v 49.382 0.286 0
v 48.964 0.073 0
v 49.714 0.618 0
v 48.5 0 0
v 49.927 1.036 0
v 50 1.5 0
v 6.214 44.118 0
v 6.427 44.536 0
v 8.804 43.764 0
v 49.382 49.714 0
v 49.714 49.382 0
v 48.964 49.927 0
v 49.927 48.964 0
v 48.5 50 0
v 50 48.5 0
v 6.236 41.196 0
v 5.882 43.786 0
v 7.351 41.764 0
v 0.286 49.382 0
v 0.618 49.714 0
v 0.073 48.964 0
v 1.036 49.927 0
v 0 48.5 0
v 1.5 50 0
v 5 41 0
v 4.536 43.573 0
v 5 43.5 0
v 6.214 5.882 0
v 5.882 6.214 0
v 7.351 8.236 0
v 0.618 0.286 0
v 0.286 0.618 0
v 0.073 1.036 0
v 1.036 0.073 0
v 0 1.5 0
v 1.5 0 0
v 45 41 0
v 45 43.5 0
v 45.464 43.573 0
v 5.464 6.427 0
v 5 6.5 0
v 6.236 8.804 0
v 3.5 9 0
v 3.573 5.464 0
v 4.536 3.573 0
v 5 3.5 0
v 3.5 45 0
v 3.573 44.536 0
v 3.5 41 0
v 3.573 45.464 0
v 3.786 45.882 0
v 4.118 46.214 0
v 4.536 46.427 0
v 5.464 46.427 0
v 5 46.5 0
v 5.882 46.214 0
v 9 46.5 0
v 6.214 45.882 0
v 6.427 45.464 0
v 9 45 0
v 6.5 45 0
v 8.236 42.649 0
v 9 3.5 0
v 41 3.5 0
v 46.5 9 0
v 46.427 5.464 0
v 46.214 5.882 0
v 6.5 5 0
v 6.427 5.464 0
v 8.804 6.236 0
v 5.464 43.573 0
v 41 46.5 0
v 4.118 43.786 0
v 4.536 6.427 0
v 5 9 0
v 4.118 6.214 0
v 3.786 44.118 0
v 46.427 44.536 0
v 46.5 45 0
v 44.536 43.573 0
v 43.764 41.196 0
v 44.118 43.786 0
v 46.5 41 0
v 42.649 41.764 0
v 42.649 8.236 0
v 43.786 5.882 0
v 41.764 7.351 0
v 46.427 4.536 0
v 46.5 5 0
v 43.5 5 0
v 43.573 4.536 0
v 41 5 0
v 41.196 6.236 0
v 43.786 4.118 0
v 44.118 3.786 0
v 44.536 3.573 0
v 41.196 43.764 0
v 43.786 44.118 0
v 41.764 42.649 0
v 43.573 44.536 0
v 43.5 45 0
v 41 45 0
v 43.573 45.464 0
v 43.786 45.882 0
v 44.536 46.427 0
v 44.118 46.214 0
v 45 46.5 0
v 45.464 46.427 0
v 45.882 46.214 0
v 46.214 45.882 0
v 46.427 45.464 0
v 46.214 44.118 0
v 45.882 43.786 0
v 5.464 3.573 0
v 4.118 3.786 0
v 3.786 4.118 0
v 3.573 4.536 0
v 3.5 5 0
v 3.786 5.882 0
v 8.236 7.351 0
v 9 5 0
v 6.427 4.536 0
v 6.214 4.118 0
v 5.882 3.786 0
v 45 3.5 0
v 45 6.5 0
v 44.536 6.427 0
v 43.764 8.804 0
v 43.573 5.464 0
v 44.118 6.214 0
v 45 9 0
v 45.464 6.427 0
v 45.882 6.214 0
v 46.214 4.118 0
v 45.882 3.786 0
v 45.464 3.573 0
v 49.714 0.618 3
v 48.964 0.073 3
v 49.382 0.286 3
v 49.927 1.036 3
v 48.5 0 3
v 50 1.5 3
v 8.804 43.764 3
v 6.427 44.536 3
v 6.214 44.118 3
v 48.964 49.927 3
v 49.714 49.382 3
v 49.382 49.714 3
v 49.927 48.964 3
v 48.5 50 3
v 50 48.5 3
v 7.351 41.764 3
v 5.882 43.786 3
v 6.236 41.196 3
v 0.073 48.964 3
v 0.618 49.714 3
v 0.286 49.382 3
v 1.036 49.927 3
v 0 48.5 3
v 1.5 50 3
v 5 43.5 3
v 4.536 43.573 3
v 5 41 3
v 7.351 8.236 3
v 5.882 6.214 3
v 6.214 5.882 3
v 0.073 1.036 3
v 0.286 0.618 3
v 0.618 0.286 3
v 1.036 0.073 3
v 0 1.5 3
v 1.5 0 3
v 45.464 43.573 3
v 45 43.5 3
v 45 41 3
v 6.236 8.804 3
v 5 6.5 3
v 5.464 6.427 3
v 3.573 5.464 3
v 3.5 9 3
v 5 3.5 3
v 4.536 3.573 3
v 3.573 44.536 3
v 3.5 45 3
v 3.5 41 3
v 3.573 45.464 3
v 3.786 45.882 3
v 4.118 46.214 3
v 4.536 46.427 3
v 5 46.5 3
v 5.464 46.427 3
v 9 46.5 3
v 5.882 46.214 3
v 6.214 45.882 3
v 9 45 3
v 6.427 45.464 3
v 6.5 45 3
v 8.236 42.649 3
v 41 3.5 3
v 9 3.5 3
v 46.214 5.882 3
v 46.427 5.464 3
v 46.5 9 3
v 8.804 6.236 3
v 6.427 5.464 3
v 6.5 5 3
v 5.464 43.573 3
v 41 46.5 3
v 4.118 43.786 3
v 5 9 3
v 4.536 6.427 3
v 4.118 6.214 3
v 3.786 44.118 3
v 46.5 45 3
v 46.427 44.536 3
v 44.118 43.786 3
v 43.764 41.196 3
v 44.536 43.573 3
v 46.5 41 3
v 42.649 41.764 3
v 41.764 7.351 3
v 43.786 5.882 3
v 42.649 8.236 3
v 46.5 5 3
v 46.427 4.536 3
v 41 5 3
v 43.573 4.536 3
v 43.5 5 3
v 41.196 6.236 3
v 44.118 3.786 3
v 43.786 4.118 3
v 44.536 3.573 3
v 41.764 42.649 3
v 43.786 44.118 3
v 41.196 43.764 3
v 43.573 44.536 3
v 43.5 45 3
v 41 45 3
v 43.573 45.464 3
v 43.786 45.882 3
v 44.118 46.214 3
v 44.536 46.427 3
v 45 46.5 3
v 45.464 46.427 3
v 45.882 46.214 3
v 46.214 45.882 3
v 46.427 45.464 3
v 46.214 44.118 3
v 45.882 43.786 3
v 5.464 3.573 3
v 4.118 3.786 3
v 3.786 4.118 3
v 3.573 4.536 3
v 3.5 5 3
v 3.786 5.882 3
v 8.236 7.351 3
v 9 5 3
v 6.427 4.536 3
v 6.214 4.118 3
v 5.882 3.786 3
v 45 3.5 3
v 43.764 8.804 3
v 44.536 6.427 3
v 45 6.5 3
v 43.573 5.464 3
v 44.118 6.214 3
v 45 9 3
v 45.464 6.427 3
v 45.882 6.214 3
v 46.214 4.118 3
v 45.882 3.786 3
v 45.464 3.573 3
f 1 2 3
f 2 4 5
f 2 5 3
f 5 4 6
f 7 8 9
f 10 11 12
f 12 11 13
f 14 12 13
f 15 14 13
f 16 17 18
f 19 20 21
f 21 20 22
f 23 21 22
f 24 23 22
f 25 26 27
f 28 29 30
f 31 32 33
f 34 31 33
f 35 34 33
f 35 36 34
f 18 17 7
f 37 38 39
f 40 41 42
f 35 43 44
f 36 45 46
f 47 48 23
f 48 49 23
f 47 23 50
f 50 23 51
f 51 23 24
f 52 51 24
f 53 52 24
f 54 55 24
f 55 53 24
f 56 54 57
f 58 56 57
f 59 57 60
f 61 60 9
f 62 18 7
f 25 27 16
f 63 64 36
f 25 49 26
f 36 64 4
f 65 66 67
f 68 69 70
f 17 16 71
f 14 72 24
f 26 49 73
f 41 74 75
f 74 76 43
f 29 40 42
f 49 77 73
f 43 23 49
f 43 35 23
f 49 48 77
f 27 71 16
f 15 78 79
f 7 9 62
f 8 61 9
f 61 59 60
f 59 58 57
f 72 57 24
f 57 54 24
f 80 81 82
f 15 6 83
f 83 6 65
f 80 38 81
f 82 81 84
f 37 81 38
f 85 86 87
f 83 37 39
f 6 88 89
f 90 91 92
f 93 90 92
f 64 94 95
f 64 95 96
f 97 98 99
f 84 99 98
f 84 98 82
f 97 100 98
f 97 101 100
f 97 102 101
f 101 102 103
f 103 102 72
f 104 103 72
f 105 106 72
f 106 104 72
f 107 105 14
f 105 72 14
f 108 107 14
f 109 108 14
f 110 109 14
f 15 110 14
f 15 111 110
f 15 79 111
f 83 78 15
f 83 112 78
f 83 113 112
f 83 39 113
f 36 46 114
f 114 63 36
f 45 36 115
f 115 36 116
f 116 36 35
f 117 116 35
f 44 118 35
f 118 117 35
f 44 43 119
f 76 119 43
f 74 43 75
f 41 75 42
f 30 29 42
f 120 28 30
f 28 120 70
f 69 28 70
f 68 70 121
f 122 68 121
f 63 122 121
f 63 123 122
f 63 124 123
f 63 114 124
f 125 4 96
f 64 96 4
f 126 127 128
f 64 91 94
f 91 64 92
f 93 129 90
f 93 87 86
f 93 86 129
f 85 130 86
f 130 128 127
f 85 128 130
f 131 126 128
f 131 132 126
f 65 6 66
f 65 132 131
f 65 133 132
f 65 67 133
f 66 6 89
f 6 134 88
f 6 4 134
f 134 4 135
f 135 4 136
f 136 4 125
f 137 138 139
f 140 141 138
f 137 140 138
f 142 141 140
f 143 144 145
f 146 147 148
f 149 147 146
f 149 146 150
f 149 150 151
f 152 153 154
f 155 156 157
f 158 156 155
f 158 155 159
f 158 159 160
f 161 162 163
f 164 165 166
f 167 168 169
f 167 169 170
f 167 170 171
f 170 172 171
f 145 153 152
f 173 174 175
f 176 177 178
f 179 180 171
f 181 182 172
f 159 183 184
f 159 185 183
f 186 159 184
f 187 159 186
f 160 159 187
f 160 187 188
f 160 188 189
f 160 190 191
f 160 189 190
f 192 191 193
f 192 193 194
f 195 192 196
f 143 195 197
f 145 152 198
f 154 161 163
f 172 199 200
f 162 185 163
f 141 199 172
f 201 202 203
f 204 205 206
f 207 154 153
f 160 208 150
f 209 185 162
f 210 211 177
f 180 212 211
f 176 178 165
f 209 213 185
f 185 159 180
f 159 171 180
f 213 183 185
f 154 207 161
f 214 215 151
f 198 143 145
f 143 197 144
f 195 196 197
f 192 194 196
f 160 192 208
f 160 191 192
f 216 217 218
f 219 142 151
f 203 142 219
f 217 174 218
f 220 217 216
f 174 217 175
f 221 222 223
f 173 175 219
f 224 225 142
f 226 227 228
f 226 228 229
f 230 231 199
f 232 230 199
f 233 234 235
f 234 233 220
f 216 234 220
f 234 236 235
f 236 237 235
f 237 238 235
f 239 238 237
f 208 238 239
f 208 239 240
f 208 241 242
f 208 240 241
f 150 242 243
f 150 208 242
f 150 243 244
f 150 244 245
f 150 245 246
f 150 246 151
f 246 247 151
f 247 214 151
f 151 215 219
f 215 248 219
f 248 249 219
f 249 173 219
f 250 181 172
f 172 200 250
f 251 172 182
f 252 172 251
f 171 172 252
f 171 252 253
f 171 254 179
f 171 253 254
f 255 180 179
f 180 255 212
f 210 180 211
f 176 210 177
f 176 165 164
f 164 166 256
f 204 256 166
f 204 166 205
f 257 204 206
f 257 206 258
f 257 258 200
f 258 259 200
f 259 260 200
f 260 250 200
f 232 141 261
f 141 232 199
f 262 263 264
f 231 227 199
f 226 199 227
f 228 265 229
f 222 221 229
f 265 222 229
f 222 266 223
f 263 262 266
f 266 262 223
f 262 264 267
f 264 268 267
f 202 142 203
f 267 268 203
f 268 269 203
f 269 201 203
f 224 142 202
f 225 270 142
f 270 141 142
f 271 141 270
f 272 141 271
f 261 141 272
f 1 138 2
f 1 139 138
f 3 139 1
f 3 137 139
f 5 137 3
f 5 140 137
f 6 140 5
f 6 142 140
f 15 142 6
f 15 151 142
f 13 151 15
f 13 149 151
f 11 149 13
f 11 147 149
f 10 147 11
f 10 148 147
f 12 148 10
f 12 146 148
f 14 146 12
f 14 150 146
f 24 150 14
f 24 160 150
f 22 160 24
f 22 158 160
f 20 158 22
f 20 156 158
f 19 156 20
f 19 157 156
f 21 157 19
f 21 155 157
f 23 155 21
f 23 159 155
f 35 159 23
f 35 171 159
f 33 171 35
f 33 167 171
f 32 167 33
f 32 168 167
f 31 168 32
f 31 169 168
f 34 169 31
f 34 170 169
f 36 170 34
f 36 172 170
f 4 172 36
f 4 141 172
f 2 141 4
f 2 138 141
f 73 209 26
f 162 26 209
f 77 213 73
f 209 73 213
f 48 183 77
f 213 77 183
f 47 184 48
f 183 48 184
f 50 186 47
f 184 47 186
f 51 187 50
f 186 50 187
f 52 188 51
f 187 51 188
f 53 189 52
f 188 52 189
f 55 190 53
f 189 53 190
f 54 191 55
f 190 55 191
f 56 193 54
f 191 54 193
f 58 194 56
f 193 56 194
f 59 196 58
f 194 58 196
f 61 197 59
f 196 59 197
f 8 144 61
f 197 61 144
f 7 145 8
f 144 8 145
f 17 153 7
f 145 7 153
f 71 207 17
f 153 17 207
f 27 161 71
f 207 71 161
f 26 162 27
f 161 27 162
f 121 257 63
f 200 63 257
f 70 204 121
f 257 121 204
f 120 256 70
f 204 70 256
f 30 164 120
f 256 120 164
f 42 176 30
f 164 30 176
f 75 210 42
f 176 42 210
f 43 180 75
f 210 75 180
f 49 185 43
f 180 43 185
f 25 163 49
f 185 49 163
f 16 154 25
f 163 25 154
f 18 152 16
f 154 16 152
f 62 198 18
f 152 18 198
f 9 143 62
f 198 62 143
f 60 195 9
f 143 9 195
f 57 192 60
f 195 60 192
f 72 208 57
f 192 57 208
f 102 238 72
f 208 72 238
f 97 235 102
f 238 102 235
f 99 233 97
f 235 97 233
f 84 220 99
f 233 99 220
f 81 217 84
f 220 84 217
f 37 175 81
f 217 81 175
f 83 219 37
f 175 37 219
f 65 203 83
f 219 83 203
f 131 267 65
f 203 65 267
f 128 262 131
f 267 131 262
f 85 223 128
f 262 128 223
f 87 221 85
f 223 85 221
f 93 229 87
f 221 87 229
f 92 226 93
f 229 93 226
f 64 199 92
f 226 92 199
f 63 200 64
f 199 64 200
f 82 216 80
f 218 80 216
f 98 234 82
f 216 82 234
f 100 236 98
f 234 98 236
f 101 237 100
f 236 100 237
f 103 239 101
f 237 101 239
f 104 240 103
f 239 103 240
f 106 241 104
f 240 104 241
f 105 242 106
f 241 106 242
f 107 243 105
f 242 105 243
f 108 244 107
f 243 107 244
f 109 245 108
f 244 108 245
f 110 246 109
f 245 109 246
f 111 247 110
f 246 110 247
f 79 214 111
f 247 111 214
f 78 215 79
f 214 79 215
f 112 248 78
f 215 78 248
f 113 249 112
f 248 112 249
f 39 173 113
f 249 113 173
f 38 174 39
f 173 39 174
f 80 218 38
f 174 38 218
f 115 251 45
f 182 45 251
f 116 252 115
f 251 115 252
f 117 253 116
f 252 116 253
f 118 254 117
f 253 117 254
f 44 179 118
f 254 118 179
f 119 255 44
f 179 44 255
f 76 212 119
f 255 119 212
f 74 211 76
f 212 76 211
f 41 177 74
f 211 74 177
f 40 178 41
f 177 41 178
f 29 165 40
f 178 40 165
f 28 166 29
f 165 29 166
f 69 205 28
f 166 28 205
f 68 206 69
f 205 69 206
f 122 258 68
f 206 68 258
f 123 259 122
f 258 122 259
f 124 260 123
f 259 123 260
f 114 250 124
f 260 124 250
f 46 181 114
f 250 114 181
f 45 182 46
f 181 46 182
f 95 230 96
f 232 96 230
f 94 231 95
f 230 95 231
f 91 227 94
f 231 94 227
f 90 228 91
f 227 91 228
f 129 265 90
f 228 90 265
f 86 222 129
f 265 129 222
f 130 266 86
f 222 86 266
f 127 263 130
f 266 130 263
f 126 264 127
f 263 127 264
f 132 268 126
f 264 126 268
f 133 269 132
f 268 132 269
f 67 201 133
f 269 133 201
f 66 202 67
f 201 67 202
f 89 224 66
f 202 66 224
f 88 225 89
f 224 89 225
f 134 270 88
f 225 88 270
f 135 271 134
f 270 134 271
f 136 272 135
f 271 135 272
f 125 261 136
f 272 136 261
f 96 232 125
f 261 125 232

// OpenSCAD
/*
OPENSCAD Library file by the DoomMeister
Mounting surround for small DC fans (25 - 120mm)

Data taken from various places around the internet.
http://www.qwikflow.com/dc_fans.html

//Released under the terms of the GNU GPL v3.0
This program is free software: you can redistribute it and/or modify
it under the terms of the GNU General Public License as published by
the Free Software Foundation, either version 3 of the License, or
(at your option) any later version.

This program is distributed in the hope that it will be useful,
but WITHOUT ANY WARRANTY; without even the implied warranty of
MERCHANTABILITY or FITNESS FOR A PARTICULAR PURPOSE. See the
GNU General Public License for more details.

You should have received a copy of the GNU General Public License
along with this program. If not, see <http://www.gnu.org/licenses/>.
*/

//uncomment this for example
fan_mount(size=50,thick=3);

module fan_mount(size=40,thick = 4)
{
if(size == 25)
	{
	_fan_mount(
			fan_size = 25,
			fan_mounting_pitch = 20,
			fan_m_hole_dia = 3,
			holder_thickness = thick
		 );
	}
if(size == 30)
	{
	_fan_mount(
			fan_size = 30,
			fan_mounting_pitch = 24,
			fan_m_hole_dia = 3,
			holder_thickness = thick
		 );
	}

if(size == 40)
	{
	_fan_mount(
			fan_size = 40,
			fan_mounting_pitch = 32,
			fan_m_hole_dia = 3.5,
			holder_thickness = thick
		 );
	}
if(size == 45)
	{
	_fan_mount(
			fan_size = 45,
			fan_mounting_pitch = 37,
			fan_m_hole_dia = 4.3,
			holder_thickness = thick
		 );
	}
if(size == 50)
	{
	_fan_mount(
			fan_size = 50,
			fan_mounting_pitch = 40,
			fan_m_hole_dia = 3,
			holder_thickness = thick
		 );
	}    
if(size == 60)
	{
	_fan_mount(
			fan_size = 60,
			fan_mounting_pitch = 50,
			fan_m_hole_dia = 4.4,
			holder_thickness = thick
		 );
	}
if(size == 80)
	{
	_fan_mount(
			fan_size = 80,
			fan_mounting_pitch = 71.5,
			fan_m_hole_dia = 4.4,
			holder_thickness = thick
		 );
	}

if(size == 120)
	{
	_fan_mount(
			fan_size = 120,
			fan_mounting_pitch = 105,
			fan_m_hole_dia = 4.4,
			holder_thickness = thick
		 );
	}
}


//inner module
module _fan_mount(
			fan_size, //nominsl size of fan
			fan_mounting_pitch, //pitch between mounting holes
			fan_m_hole_dia, //mounting hole diameter
			holder_thickness //user defined thickness
		 )
{

offset1 = (fan_size-(fan_mounting_pitch + fan_m_hole_dia))/2;
offset2 = (fan_size-(fan_mounting_pitch))/2;
offset3 = offset2 + fan_mounting_pitch;
thickness = (fan_size-fan_mounting_pitch)/2;	
			
			//difference()
			//{
			linear_extrude(height = holder_thickness)
			union()
			{	
			difference()
			{
				translate([fan_m_hole_dia/2,fan_m_hole_dia/2,0])
				minkowski()
				{	
					square([fan_size - fan_m_hole_dia,fan_size - fan_m_hole_dia]);
					circle(r= fan_m_hole_dia/2, $fn=20);
				}
			
					translate([offset1,offset1,0])
					square([fan_mounting_pitch + fan_m_hole_dia,fan_mounting_pitch + fan_m_hole_dia]);
				}
				translate([offset2,offset2,0])
				rotate([0,0,0])_corner_hole();
				translate([offset3,offset2,0])
				rotate([0,0,90])_corner_hole();
				translate([offset2,offset3,0])
				rotate([0,0,90])_corner_hole();
				translate([offset3,offset3,0])
				rotate([0,0,0])_corner_hole();
			}

module _corner_hole()
{
				difference(){
					union(){
							difference(){
							square([fan_m_hole_dia + thickness,fan_m_hole_dia + thickness],center=true);
							square([(fan_m_hole_dia + thickness)/2,(fan_m_hole_dia + thickness)/2],center=false);
							translate([-(fan_m_hole_dia + thickness)/2,-(fan_m_hole_dia + thickness)/2])
							square([(fan_m_hole_dia + thickness)/2,(fan_m_hole_dia + thickness)/2],center=false);
							}
					circle(r=(fan_m_hole_dia + thickness)/2, $fn=20);
					}
					circle(r=(fan_m_hole_dia)/2, $fn=20);
				}
}


echo(offset1,offset2,thickness);
}
